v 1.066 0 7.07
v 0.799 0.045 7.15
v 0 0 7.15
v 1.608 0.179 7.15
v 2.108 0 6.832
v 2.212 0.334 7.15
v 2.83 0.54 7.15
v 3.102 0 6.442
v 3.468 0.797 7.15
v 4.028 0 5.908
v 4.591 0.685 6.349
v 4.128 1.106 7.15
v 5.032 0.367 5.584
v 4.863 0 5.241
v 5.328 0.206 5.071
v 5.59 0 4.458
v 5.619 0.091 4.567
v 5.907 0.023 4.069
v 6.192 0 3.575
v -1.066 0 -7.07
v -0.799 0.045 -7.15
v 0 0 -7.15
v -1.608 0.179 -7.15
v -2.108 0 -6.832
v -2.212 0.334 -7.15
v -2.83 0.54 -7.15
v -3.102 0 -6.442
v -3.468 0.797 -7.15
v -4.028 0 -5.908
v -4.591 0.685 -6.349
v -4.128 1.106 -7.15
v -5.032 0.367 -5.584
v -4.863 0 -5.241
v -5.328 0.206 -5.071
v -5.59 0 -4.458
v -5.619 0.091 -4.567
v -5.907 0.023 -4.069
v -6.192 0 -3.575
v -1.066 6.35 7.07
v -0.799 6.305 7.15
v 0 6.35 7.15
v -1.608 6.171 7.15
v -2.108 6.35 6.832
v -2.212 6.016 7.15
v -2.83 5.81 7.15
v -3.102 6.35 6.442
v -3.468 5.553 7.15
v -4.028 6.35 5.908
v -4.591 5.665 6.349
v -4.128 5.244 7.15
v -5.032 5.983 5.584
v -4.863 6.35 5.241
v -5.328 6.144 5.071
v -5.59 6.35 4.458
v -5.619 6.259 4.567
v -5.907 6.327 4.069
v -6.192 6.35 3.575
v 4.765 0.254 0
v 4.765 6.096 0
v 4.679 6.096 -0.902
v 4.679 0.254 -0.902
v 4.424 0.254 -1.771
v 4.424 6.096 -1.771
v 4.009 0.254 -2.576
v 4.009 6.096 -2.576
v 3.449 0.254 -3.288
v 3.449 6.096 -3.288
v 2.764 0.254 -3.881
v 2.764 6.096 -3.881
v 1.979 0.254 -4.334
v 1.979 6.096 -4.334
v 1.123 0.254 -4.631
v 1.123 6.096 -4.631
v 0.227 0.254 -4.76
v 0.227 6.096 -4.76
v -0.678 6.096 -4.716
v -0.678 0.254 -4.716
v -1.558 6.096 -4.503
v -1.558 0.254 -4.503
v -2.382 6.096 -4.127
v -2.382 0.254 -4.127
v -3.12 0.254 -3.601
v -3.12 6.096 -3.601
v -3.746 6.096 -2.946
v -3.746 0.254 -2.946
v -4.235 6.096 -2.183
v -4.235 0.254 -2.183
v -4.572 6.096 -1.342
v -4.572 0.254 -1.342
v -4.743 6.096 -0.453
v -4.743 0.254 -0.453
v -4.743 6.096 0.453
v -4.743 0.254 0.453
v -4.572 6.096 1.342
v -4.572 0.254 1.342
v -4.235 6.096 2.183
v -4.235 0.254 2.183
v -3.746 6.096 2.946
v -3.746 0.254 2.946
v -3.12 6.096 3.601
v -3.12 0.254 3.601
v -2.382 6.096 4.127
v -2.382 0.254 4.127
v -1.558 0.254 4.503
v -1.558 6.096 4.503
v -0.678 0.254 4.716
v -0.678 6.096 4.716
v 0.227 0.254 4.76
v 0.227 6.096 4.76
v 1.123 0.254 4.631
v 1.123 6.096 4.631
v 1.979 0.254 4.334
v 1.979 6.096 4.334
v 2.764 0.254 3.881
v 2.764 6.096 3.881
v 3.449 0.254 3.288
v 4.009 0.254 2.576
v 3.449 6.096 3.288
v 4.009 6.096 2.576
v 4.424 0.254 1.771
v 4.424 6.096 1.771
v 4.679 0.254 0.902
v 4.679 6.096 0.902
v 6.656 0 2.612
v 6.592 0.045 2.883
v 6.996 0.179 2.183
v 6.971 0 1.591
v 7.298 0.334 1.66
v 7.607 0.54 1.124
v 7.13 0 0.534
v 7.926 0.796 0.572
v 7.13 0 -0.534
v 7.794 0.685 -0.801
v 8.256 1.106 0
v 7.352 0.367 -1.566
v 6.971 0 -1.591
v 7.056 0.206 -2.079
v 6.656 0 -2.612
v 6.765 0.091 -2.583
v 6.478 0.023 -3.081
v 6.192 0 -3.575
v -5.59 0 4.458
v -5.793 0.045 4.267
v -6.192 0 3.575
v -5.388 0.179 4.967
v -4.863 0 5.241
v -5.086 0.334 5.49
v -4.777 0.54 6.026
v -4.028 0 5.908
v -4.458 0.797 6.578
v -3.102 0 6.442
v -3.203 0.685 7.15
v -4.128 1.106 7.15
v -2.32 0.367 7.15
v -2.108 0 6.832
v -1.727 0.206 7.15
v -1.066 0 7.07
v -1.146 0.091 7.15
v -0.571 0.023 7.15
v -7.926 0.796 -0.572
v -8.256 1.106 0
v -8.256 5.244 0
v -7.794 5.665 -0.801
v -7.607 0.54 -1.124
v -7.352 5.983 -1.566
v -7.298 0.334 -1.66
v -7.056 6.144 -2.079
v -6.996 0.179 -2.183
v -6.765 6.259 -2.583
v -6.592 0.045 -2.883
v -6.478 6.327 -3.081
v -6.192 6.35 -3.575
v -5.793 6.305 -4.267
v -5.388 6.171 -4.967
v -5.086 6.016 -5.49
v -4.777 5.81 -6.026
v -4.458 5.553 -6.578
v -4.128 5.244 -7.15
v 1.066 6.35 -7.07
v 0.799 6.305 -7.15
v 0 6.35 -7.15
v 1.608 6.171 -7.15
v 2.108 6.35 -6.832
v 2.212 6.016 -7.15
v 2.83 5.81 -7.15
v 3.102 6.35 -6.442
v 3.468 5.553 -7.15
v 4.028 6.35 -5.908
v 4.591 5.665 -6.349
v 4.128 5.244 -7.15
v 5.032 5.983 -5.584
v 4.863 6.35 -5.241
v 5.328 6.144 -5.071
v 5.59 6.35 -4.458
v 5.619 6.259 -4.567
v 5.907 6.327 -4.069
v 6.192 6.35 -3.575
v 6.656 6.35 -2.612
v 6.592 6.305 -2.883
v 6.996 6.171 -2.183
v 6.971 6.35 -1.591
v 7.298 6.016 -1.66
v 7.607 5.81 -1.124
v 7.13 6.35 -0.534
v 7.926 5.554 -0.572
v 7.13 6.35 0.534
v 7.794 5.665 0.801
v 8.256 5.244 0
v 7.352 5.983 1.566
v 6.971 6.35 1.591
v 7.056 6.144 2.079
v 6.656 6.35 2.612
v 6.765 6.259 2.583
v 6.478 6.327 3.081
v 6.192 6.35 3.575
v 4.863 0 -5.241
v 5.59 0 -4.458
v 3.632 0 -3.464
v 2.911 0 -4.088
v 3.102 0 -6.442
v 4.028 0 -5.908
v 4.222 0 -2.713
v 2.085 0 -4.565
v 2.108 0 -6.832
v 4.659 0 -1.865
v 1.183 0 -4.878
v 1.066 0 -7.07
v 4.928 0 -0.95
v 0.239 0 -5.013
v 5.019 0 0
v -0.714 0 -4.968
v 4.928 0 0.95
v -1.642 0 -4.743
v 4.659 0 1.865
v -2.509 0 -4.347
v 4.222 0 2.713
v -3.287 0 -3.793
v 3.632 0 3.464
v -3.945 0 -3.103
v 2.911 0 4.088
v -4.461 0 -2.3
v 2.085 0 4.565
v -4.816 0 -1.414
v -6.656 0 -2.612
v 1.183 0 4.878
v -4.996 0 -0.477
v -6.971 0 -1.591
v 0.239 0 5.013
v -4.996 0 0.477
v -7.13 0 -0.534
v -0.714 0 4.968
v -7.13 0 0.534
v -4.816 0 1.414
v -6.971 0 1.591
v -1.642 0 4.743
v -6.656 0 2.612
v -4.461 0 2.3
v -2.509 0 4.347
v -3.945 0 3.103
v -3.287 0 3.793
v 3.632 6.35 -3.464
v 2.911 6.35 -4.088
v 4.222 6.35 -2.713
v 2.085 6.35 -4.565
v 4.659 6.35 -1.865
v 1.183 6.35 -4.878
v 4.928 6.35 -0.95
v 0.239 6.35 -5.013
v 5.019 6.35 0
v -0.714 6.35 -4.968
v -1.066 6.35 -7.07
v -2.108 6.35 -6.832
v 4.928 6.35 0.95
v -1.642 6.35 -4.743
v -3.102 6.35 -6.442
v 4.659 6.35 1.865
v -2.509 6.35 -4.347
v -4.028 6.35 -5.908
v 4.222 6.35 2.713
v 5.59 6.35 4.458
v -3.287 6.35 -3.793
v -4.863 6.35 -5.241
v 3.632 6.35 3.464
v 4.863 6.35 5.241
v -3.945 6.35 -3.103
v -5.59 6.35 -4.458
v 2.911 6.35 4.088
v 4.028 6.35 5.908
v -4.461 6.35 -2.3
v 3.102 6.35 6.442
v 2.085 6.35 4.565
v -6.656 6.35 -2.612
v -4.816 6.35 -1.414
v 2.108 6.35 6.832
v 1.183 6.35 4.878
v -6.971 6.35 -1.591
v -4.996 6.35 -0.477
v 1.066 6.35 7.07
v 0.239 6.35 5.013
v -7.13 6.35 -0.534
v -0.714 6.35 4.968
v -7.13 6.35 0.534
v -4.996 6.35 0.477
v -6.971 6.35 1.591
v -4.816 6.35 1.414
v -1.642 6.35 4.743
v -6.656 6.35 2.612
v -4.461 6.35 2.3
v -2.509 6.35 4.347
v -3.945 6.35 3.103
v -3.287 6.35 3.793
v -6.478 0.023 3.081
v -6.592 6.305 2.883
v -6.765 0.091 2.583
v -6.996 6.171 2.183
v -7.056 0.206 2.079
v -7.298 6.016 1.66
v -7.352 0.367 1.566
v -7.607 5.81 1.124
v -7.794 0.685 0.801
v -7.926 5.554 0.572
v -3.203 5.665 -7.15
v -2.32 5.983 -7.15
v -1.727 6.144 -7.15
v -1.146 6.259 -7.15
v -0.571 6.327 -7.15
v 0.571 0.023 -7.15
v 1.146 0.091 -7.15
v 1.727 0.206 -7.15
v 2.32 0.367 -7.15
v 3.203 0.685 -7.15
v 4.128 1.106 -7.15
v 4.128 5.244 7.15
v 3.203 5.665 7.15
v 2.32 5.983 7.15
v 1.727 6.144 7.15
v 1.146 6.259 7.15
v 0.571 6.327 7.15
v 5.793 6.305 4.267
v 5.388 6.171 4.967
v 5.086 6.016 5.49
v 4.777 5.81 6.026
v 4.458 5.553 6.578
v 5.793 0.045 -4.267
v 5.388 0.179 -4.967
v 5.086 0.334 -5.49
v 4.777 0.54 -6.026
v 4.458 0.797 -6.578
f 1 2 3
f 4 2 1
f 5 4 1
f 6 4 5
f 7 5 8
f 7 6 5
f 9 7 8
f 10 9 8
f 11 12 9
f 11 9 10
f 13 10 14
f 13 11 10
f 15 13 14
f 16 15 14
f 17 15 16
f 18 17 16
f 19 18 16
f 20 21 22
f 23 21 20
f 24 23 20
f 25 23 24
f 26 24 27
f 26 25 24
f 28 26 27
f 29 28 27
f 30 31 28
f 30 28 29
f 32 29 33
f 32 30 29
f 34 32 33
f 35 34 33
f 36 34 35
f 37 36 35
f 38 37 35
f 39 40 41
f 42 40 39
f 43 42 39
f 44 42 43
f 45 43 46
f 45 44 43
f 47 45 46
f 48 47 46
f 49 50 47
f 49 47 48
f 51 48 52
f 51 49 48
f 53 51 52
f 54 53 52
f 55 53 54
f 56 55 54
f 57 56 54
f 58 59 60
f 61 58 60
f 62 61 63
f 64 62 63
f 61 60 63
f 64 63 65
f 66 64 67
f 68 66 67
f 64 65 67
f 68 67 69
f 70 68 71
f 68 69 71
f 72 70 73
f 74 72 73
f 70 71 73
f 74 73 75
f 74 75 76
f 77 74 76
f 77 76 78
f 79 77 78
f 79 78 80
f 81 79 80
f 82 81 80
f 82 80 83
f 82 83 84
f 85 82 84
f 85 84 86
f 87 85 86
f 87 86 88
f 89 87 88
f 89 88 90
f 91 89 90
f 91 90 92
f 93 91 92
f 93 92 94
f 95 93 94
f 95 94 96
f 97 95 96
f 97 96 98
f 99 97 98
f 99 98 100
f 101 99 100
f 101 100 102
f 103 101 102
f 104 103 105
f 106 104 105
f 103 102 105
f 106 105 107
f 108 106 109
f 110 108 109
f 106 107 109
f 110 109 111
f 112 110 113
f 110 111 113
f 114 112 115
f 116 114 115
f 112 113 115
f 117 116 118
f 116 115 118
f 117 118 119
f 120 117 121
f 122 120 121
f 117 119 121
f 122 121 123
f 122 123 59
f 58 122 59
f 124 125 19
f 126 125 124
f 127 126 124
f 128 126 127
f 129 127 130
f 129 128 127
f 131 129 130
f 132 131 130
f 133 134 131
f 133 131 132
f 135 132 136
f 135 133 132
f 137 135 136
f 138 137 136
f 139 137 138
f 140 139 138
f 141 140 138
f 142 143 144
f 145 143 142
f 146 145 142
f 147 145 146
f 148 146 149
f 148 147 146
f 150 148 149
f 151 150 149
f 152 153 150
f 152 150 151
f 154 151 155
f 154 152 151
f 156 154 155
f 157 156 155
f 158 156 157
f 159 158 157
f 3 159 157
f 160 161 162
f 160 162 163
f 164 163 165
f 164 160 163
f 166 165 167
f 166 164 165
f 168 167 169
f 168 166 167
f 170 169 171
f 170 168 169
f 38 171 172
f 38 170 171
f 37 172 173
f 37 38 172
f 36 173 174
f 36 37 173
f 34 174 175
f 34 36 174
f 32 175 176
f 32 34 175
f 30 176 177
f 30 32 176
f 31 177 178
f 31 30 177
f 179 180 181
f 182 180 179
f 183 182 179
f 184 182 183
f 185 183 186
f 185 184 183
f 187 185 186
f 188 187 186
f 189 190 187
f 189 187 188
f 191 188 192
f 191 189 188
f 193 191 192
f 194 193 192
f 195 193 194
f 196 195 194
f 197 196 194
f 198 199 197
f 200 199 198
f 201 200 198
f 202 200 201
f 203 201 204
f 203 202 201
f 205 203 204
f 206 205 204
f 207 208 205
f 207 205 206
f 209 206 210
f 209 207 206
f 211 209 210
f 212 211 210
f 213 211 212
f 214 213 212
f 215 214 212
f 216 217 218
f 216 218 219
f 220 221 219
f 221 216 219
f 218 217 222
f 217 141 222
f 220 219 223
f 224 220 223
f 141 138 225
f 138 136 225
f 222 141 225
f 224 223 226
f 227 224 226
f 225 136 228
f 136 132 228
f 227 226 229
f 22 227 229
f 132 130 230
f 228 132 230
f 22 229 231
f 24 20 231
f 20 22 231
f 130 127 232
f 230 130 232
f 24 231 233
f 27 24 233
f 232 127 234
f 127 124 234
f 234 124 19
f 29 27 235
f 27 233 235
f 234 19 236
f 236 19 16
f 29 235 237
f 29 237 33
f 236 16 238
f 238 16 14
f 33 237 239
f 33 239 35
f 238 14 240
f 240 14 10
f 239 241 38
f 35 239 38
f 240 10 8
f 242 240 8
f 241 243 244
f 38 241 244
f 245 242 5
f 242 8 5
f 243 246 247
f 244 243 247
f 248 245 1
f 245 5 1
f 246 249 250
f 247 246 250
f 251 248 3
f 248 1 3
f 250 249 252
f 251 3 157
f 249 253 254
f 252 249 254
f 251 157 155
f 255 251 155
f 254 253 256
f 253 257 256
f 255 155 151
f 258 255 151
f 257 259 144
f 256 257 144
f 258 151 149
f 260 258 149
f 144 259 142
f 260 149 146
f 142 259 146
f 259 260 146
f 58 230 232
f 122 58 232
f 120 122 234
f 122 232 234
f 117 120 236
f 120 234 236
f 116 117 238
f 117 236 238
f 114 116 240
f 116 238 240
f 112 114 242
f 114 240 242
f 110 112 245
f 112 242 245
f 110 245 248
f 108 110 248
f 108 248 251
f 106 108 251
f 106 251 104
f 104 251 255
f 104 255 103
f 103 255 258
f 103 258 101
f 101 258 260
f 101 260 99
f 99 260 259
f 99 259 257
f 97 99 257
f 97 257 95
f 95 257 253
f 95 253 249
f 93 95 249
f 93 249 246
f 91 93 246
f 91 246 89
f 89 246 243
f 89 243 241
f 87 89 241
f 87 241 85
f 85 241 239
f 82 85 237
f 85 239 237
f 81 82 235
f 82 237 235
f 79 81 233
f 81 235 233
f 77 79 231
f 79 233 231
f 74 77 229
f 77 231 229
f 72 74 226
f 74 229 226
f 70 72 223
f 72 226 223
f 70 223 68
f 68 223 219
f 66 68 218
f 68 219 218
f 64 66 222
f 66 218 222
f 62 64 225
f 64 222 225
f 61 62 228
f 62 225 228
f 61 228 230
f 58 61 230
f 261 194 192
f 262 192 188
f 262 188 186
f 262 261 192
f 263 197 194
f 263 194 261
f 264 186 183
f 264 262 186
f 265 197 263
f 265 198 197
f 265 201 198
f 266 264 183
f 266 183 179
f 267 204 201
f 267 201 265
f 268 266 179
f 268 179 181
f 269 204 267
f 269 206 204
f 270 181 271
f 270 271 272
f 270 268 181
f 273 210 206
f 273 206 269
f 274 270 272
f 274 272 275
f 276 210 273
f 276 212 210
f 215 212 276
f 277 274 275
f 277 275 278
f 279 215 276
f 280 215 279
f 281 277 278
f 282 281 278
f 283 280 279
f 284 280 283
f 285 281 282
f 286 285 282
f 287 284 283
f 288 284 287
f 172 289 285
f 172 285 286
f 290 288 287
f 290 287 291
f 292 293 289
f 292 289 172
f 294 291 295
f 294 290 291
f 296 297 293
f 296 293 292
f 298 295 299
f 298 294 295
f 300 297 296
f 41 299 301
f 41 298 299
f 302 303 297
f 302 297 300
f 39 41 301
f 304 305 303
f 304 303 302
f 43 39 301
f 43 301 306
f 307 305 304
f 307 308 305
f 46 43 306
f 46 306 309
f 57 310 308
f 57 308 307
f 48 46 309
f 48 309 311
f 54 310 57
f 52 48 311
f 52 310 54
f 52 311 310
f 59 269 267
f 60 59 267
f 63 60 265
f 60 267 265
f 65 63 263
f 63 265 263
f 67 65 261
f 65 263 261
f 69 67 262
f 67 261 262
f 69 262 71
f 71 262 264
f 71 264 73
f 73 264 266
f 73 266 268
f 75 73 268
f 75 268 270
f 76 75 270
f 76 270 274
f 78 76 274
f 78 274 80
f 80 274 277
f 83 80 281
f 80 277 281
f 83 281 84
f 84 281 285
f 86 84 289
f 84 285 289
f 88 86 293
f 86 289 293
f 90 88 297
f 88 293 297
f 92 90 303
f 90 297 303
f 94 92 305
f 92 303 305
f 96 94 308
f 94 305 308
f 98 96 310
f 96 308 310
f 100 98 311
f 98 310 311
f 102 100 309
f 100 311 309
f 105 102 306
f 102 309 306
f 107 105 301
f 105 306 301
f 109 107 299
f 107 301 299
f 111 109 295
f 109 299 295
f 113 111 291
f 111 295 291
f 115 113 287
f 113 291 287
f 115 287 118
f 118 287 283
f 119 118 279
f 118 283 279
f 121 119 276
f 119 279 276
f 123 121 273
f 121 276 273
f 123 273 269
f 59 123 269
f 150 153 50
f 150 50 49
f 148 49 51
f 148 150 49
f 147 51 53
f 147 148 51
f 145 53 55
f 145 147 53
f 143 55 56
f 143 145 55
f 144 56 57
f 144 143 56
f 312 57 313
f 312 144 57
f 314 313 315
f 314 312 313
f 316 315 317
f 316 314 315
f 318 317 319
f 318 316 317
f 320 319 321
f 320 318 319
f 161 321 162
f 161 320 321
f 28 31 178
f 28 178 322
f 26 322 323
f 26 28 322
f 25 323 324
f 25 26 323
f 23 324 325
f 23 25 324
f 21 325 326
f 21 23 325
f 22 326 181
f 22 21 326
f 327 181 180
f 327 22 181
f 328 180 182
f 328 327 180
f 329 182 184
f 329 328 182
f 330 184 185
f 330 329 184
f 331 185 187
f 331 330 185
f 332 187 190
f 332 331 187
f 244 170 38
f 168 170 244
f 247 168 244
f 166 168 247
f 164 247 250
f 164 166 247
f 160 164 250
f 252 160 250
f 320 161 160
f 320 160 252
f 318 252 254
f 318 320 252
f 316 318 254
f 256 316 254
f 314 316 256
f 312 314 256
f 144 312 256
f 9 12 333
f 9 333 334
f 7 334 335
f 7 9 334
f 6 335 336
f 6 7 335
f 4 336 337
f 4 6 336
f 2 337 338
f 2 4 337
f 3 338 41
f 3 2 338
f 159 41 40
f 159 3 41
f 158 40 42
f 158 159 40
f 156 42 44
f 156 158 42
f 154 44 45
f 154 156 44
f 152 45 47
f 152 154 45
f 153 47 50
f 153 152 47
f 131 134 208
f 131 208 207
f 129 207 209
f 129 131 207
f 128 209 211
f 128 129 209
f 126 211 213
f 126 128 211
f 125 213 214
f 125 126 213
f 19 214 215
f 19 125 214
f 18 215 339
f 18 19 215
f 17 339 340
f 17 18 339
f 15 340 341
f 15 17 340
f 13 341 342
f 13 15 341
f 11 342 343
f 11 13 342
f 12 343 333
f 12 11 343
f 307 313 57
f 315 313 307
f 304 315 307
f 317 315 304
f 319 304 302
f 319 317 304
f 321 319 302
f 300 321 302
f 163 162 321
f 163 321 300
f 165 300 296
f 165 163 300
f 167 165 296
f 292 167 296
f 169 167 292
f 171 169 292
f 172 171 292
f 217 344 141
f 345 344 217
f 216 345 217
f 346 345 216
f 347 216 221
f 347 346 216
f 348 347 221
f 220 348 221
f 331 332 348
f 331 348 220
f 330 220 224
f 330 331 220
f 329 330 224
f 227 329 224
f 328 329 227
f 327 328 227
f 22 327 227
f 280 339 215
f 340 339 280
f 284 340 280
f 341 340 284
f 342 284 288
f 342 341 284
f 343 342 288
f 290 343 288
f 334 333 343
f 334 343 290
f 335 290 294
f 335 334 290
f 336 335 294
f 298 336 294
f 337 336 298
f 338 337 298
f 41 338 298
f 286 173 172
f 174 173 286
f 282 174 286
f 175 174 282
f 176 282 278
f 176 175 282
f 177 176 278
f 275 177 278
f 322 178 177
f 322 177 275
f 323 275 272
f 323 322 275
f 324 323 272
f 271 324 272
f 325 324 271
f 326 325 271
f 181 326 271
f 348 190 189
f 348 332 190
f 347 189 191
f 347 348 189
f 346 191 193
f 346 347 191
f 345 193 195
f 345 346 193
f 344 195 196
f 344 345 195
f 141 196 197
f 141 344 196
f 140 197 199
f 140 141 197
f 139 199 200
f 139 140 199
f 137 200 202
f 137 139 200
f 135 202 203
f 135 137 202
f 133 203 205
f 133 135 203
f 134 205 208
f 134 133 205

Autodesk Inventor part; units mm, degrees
ref_plane "YZ Plane" through (0, 0, 0) normal (1, 0, 0) x (0, 1, 0)
ref_plane "XZ Plane" through (0, 0, 0) normal (0, 1, 0) x (-1, 0, 0)
ref_plane "XY Plane" through (0, 0, 0) normal (0, 0, 1) x (1, 0, 0)
sketch "Sketch1" plane through (0, 0, 0) normal (0, 1, 0) x (-1, 0, 0)
  line L0 (8.2561, 0) -> (4.1281, -7.15)
  line L1 (4.1281, -7.15) -> (-4.1281, -7.15)
  line L2 (-4.1281, -7.15) -> (-8.2561, 0)
  line L3 (-8.2561, 0) -> (-4.1281, 7.15)
  line L4 (-4.1281, 7.15) -> (4.1281, 7.15)
  line L5 (4.1281, 7.15) -> (8.2561, 0)
  point P0 (0, 0)
  point P1 (0, 0)
  dimension "d0" = 14.3
extrude "Extrusion1" add sketch "Sketch1" along normal blind 6.35
sketch "Sketch2" plane through (0, 6.35, 0) normal (0, 1, 0) x (1, 0, 0)
  circle A0 centre (0, 0) radius 4.765
  dimension "d3" = 9.53
extrude "Extrusion2" cut sketch "Sketch2" against normal through all
thread "Thread1" size "M10x1.5" class "6H" standard "ANSI Metric M Profile" length 18.32
chamfer "Chamfer1" distance 0.254 angle 45 2 edges at (-4.765, 0, 0) (-4.765, 6.35, 0)
sketch "Sketch3" plane through (0, 6.35, 0) normal (0, 1, 0) x (1, 0, 0)
  circle A0 centre (0, 0) radius 7.15
  line L0 (-8.2561, 0) -> (-4.1281, -7.15) projected
extrude "Extrusion3" cut sketch "Sketch3" against normal blind 6.35 draft 45 keep common part
sketch "Sketch4" plane through (0, 0, 0) normal (0, -1, 0) x (1, 0, 0)
  arc A0 (0, 7.15) -> (-6.1921, 3.575) centre (0, 0) ccw projected
  circle A1 centre (0, 0) radius 7.15
  point P0 (0, 7.15)
extrude "Extrusion4" cut sketch "Sketch4" against normal blind 6.35 draft 45 keep common part
properties part number "Nut" material "Stainless Steel"
